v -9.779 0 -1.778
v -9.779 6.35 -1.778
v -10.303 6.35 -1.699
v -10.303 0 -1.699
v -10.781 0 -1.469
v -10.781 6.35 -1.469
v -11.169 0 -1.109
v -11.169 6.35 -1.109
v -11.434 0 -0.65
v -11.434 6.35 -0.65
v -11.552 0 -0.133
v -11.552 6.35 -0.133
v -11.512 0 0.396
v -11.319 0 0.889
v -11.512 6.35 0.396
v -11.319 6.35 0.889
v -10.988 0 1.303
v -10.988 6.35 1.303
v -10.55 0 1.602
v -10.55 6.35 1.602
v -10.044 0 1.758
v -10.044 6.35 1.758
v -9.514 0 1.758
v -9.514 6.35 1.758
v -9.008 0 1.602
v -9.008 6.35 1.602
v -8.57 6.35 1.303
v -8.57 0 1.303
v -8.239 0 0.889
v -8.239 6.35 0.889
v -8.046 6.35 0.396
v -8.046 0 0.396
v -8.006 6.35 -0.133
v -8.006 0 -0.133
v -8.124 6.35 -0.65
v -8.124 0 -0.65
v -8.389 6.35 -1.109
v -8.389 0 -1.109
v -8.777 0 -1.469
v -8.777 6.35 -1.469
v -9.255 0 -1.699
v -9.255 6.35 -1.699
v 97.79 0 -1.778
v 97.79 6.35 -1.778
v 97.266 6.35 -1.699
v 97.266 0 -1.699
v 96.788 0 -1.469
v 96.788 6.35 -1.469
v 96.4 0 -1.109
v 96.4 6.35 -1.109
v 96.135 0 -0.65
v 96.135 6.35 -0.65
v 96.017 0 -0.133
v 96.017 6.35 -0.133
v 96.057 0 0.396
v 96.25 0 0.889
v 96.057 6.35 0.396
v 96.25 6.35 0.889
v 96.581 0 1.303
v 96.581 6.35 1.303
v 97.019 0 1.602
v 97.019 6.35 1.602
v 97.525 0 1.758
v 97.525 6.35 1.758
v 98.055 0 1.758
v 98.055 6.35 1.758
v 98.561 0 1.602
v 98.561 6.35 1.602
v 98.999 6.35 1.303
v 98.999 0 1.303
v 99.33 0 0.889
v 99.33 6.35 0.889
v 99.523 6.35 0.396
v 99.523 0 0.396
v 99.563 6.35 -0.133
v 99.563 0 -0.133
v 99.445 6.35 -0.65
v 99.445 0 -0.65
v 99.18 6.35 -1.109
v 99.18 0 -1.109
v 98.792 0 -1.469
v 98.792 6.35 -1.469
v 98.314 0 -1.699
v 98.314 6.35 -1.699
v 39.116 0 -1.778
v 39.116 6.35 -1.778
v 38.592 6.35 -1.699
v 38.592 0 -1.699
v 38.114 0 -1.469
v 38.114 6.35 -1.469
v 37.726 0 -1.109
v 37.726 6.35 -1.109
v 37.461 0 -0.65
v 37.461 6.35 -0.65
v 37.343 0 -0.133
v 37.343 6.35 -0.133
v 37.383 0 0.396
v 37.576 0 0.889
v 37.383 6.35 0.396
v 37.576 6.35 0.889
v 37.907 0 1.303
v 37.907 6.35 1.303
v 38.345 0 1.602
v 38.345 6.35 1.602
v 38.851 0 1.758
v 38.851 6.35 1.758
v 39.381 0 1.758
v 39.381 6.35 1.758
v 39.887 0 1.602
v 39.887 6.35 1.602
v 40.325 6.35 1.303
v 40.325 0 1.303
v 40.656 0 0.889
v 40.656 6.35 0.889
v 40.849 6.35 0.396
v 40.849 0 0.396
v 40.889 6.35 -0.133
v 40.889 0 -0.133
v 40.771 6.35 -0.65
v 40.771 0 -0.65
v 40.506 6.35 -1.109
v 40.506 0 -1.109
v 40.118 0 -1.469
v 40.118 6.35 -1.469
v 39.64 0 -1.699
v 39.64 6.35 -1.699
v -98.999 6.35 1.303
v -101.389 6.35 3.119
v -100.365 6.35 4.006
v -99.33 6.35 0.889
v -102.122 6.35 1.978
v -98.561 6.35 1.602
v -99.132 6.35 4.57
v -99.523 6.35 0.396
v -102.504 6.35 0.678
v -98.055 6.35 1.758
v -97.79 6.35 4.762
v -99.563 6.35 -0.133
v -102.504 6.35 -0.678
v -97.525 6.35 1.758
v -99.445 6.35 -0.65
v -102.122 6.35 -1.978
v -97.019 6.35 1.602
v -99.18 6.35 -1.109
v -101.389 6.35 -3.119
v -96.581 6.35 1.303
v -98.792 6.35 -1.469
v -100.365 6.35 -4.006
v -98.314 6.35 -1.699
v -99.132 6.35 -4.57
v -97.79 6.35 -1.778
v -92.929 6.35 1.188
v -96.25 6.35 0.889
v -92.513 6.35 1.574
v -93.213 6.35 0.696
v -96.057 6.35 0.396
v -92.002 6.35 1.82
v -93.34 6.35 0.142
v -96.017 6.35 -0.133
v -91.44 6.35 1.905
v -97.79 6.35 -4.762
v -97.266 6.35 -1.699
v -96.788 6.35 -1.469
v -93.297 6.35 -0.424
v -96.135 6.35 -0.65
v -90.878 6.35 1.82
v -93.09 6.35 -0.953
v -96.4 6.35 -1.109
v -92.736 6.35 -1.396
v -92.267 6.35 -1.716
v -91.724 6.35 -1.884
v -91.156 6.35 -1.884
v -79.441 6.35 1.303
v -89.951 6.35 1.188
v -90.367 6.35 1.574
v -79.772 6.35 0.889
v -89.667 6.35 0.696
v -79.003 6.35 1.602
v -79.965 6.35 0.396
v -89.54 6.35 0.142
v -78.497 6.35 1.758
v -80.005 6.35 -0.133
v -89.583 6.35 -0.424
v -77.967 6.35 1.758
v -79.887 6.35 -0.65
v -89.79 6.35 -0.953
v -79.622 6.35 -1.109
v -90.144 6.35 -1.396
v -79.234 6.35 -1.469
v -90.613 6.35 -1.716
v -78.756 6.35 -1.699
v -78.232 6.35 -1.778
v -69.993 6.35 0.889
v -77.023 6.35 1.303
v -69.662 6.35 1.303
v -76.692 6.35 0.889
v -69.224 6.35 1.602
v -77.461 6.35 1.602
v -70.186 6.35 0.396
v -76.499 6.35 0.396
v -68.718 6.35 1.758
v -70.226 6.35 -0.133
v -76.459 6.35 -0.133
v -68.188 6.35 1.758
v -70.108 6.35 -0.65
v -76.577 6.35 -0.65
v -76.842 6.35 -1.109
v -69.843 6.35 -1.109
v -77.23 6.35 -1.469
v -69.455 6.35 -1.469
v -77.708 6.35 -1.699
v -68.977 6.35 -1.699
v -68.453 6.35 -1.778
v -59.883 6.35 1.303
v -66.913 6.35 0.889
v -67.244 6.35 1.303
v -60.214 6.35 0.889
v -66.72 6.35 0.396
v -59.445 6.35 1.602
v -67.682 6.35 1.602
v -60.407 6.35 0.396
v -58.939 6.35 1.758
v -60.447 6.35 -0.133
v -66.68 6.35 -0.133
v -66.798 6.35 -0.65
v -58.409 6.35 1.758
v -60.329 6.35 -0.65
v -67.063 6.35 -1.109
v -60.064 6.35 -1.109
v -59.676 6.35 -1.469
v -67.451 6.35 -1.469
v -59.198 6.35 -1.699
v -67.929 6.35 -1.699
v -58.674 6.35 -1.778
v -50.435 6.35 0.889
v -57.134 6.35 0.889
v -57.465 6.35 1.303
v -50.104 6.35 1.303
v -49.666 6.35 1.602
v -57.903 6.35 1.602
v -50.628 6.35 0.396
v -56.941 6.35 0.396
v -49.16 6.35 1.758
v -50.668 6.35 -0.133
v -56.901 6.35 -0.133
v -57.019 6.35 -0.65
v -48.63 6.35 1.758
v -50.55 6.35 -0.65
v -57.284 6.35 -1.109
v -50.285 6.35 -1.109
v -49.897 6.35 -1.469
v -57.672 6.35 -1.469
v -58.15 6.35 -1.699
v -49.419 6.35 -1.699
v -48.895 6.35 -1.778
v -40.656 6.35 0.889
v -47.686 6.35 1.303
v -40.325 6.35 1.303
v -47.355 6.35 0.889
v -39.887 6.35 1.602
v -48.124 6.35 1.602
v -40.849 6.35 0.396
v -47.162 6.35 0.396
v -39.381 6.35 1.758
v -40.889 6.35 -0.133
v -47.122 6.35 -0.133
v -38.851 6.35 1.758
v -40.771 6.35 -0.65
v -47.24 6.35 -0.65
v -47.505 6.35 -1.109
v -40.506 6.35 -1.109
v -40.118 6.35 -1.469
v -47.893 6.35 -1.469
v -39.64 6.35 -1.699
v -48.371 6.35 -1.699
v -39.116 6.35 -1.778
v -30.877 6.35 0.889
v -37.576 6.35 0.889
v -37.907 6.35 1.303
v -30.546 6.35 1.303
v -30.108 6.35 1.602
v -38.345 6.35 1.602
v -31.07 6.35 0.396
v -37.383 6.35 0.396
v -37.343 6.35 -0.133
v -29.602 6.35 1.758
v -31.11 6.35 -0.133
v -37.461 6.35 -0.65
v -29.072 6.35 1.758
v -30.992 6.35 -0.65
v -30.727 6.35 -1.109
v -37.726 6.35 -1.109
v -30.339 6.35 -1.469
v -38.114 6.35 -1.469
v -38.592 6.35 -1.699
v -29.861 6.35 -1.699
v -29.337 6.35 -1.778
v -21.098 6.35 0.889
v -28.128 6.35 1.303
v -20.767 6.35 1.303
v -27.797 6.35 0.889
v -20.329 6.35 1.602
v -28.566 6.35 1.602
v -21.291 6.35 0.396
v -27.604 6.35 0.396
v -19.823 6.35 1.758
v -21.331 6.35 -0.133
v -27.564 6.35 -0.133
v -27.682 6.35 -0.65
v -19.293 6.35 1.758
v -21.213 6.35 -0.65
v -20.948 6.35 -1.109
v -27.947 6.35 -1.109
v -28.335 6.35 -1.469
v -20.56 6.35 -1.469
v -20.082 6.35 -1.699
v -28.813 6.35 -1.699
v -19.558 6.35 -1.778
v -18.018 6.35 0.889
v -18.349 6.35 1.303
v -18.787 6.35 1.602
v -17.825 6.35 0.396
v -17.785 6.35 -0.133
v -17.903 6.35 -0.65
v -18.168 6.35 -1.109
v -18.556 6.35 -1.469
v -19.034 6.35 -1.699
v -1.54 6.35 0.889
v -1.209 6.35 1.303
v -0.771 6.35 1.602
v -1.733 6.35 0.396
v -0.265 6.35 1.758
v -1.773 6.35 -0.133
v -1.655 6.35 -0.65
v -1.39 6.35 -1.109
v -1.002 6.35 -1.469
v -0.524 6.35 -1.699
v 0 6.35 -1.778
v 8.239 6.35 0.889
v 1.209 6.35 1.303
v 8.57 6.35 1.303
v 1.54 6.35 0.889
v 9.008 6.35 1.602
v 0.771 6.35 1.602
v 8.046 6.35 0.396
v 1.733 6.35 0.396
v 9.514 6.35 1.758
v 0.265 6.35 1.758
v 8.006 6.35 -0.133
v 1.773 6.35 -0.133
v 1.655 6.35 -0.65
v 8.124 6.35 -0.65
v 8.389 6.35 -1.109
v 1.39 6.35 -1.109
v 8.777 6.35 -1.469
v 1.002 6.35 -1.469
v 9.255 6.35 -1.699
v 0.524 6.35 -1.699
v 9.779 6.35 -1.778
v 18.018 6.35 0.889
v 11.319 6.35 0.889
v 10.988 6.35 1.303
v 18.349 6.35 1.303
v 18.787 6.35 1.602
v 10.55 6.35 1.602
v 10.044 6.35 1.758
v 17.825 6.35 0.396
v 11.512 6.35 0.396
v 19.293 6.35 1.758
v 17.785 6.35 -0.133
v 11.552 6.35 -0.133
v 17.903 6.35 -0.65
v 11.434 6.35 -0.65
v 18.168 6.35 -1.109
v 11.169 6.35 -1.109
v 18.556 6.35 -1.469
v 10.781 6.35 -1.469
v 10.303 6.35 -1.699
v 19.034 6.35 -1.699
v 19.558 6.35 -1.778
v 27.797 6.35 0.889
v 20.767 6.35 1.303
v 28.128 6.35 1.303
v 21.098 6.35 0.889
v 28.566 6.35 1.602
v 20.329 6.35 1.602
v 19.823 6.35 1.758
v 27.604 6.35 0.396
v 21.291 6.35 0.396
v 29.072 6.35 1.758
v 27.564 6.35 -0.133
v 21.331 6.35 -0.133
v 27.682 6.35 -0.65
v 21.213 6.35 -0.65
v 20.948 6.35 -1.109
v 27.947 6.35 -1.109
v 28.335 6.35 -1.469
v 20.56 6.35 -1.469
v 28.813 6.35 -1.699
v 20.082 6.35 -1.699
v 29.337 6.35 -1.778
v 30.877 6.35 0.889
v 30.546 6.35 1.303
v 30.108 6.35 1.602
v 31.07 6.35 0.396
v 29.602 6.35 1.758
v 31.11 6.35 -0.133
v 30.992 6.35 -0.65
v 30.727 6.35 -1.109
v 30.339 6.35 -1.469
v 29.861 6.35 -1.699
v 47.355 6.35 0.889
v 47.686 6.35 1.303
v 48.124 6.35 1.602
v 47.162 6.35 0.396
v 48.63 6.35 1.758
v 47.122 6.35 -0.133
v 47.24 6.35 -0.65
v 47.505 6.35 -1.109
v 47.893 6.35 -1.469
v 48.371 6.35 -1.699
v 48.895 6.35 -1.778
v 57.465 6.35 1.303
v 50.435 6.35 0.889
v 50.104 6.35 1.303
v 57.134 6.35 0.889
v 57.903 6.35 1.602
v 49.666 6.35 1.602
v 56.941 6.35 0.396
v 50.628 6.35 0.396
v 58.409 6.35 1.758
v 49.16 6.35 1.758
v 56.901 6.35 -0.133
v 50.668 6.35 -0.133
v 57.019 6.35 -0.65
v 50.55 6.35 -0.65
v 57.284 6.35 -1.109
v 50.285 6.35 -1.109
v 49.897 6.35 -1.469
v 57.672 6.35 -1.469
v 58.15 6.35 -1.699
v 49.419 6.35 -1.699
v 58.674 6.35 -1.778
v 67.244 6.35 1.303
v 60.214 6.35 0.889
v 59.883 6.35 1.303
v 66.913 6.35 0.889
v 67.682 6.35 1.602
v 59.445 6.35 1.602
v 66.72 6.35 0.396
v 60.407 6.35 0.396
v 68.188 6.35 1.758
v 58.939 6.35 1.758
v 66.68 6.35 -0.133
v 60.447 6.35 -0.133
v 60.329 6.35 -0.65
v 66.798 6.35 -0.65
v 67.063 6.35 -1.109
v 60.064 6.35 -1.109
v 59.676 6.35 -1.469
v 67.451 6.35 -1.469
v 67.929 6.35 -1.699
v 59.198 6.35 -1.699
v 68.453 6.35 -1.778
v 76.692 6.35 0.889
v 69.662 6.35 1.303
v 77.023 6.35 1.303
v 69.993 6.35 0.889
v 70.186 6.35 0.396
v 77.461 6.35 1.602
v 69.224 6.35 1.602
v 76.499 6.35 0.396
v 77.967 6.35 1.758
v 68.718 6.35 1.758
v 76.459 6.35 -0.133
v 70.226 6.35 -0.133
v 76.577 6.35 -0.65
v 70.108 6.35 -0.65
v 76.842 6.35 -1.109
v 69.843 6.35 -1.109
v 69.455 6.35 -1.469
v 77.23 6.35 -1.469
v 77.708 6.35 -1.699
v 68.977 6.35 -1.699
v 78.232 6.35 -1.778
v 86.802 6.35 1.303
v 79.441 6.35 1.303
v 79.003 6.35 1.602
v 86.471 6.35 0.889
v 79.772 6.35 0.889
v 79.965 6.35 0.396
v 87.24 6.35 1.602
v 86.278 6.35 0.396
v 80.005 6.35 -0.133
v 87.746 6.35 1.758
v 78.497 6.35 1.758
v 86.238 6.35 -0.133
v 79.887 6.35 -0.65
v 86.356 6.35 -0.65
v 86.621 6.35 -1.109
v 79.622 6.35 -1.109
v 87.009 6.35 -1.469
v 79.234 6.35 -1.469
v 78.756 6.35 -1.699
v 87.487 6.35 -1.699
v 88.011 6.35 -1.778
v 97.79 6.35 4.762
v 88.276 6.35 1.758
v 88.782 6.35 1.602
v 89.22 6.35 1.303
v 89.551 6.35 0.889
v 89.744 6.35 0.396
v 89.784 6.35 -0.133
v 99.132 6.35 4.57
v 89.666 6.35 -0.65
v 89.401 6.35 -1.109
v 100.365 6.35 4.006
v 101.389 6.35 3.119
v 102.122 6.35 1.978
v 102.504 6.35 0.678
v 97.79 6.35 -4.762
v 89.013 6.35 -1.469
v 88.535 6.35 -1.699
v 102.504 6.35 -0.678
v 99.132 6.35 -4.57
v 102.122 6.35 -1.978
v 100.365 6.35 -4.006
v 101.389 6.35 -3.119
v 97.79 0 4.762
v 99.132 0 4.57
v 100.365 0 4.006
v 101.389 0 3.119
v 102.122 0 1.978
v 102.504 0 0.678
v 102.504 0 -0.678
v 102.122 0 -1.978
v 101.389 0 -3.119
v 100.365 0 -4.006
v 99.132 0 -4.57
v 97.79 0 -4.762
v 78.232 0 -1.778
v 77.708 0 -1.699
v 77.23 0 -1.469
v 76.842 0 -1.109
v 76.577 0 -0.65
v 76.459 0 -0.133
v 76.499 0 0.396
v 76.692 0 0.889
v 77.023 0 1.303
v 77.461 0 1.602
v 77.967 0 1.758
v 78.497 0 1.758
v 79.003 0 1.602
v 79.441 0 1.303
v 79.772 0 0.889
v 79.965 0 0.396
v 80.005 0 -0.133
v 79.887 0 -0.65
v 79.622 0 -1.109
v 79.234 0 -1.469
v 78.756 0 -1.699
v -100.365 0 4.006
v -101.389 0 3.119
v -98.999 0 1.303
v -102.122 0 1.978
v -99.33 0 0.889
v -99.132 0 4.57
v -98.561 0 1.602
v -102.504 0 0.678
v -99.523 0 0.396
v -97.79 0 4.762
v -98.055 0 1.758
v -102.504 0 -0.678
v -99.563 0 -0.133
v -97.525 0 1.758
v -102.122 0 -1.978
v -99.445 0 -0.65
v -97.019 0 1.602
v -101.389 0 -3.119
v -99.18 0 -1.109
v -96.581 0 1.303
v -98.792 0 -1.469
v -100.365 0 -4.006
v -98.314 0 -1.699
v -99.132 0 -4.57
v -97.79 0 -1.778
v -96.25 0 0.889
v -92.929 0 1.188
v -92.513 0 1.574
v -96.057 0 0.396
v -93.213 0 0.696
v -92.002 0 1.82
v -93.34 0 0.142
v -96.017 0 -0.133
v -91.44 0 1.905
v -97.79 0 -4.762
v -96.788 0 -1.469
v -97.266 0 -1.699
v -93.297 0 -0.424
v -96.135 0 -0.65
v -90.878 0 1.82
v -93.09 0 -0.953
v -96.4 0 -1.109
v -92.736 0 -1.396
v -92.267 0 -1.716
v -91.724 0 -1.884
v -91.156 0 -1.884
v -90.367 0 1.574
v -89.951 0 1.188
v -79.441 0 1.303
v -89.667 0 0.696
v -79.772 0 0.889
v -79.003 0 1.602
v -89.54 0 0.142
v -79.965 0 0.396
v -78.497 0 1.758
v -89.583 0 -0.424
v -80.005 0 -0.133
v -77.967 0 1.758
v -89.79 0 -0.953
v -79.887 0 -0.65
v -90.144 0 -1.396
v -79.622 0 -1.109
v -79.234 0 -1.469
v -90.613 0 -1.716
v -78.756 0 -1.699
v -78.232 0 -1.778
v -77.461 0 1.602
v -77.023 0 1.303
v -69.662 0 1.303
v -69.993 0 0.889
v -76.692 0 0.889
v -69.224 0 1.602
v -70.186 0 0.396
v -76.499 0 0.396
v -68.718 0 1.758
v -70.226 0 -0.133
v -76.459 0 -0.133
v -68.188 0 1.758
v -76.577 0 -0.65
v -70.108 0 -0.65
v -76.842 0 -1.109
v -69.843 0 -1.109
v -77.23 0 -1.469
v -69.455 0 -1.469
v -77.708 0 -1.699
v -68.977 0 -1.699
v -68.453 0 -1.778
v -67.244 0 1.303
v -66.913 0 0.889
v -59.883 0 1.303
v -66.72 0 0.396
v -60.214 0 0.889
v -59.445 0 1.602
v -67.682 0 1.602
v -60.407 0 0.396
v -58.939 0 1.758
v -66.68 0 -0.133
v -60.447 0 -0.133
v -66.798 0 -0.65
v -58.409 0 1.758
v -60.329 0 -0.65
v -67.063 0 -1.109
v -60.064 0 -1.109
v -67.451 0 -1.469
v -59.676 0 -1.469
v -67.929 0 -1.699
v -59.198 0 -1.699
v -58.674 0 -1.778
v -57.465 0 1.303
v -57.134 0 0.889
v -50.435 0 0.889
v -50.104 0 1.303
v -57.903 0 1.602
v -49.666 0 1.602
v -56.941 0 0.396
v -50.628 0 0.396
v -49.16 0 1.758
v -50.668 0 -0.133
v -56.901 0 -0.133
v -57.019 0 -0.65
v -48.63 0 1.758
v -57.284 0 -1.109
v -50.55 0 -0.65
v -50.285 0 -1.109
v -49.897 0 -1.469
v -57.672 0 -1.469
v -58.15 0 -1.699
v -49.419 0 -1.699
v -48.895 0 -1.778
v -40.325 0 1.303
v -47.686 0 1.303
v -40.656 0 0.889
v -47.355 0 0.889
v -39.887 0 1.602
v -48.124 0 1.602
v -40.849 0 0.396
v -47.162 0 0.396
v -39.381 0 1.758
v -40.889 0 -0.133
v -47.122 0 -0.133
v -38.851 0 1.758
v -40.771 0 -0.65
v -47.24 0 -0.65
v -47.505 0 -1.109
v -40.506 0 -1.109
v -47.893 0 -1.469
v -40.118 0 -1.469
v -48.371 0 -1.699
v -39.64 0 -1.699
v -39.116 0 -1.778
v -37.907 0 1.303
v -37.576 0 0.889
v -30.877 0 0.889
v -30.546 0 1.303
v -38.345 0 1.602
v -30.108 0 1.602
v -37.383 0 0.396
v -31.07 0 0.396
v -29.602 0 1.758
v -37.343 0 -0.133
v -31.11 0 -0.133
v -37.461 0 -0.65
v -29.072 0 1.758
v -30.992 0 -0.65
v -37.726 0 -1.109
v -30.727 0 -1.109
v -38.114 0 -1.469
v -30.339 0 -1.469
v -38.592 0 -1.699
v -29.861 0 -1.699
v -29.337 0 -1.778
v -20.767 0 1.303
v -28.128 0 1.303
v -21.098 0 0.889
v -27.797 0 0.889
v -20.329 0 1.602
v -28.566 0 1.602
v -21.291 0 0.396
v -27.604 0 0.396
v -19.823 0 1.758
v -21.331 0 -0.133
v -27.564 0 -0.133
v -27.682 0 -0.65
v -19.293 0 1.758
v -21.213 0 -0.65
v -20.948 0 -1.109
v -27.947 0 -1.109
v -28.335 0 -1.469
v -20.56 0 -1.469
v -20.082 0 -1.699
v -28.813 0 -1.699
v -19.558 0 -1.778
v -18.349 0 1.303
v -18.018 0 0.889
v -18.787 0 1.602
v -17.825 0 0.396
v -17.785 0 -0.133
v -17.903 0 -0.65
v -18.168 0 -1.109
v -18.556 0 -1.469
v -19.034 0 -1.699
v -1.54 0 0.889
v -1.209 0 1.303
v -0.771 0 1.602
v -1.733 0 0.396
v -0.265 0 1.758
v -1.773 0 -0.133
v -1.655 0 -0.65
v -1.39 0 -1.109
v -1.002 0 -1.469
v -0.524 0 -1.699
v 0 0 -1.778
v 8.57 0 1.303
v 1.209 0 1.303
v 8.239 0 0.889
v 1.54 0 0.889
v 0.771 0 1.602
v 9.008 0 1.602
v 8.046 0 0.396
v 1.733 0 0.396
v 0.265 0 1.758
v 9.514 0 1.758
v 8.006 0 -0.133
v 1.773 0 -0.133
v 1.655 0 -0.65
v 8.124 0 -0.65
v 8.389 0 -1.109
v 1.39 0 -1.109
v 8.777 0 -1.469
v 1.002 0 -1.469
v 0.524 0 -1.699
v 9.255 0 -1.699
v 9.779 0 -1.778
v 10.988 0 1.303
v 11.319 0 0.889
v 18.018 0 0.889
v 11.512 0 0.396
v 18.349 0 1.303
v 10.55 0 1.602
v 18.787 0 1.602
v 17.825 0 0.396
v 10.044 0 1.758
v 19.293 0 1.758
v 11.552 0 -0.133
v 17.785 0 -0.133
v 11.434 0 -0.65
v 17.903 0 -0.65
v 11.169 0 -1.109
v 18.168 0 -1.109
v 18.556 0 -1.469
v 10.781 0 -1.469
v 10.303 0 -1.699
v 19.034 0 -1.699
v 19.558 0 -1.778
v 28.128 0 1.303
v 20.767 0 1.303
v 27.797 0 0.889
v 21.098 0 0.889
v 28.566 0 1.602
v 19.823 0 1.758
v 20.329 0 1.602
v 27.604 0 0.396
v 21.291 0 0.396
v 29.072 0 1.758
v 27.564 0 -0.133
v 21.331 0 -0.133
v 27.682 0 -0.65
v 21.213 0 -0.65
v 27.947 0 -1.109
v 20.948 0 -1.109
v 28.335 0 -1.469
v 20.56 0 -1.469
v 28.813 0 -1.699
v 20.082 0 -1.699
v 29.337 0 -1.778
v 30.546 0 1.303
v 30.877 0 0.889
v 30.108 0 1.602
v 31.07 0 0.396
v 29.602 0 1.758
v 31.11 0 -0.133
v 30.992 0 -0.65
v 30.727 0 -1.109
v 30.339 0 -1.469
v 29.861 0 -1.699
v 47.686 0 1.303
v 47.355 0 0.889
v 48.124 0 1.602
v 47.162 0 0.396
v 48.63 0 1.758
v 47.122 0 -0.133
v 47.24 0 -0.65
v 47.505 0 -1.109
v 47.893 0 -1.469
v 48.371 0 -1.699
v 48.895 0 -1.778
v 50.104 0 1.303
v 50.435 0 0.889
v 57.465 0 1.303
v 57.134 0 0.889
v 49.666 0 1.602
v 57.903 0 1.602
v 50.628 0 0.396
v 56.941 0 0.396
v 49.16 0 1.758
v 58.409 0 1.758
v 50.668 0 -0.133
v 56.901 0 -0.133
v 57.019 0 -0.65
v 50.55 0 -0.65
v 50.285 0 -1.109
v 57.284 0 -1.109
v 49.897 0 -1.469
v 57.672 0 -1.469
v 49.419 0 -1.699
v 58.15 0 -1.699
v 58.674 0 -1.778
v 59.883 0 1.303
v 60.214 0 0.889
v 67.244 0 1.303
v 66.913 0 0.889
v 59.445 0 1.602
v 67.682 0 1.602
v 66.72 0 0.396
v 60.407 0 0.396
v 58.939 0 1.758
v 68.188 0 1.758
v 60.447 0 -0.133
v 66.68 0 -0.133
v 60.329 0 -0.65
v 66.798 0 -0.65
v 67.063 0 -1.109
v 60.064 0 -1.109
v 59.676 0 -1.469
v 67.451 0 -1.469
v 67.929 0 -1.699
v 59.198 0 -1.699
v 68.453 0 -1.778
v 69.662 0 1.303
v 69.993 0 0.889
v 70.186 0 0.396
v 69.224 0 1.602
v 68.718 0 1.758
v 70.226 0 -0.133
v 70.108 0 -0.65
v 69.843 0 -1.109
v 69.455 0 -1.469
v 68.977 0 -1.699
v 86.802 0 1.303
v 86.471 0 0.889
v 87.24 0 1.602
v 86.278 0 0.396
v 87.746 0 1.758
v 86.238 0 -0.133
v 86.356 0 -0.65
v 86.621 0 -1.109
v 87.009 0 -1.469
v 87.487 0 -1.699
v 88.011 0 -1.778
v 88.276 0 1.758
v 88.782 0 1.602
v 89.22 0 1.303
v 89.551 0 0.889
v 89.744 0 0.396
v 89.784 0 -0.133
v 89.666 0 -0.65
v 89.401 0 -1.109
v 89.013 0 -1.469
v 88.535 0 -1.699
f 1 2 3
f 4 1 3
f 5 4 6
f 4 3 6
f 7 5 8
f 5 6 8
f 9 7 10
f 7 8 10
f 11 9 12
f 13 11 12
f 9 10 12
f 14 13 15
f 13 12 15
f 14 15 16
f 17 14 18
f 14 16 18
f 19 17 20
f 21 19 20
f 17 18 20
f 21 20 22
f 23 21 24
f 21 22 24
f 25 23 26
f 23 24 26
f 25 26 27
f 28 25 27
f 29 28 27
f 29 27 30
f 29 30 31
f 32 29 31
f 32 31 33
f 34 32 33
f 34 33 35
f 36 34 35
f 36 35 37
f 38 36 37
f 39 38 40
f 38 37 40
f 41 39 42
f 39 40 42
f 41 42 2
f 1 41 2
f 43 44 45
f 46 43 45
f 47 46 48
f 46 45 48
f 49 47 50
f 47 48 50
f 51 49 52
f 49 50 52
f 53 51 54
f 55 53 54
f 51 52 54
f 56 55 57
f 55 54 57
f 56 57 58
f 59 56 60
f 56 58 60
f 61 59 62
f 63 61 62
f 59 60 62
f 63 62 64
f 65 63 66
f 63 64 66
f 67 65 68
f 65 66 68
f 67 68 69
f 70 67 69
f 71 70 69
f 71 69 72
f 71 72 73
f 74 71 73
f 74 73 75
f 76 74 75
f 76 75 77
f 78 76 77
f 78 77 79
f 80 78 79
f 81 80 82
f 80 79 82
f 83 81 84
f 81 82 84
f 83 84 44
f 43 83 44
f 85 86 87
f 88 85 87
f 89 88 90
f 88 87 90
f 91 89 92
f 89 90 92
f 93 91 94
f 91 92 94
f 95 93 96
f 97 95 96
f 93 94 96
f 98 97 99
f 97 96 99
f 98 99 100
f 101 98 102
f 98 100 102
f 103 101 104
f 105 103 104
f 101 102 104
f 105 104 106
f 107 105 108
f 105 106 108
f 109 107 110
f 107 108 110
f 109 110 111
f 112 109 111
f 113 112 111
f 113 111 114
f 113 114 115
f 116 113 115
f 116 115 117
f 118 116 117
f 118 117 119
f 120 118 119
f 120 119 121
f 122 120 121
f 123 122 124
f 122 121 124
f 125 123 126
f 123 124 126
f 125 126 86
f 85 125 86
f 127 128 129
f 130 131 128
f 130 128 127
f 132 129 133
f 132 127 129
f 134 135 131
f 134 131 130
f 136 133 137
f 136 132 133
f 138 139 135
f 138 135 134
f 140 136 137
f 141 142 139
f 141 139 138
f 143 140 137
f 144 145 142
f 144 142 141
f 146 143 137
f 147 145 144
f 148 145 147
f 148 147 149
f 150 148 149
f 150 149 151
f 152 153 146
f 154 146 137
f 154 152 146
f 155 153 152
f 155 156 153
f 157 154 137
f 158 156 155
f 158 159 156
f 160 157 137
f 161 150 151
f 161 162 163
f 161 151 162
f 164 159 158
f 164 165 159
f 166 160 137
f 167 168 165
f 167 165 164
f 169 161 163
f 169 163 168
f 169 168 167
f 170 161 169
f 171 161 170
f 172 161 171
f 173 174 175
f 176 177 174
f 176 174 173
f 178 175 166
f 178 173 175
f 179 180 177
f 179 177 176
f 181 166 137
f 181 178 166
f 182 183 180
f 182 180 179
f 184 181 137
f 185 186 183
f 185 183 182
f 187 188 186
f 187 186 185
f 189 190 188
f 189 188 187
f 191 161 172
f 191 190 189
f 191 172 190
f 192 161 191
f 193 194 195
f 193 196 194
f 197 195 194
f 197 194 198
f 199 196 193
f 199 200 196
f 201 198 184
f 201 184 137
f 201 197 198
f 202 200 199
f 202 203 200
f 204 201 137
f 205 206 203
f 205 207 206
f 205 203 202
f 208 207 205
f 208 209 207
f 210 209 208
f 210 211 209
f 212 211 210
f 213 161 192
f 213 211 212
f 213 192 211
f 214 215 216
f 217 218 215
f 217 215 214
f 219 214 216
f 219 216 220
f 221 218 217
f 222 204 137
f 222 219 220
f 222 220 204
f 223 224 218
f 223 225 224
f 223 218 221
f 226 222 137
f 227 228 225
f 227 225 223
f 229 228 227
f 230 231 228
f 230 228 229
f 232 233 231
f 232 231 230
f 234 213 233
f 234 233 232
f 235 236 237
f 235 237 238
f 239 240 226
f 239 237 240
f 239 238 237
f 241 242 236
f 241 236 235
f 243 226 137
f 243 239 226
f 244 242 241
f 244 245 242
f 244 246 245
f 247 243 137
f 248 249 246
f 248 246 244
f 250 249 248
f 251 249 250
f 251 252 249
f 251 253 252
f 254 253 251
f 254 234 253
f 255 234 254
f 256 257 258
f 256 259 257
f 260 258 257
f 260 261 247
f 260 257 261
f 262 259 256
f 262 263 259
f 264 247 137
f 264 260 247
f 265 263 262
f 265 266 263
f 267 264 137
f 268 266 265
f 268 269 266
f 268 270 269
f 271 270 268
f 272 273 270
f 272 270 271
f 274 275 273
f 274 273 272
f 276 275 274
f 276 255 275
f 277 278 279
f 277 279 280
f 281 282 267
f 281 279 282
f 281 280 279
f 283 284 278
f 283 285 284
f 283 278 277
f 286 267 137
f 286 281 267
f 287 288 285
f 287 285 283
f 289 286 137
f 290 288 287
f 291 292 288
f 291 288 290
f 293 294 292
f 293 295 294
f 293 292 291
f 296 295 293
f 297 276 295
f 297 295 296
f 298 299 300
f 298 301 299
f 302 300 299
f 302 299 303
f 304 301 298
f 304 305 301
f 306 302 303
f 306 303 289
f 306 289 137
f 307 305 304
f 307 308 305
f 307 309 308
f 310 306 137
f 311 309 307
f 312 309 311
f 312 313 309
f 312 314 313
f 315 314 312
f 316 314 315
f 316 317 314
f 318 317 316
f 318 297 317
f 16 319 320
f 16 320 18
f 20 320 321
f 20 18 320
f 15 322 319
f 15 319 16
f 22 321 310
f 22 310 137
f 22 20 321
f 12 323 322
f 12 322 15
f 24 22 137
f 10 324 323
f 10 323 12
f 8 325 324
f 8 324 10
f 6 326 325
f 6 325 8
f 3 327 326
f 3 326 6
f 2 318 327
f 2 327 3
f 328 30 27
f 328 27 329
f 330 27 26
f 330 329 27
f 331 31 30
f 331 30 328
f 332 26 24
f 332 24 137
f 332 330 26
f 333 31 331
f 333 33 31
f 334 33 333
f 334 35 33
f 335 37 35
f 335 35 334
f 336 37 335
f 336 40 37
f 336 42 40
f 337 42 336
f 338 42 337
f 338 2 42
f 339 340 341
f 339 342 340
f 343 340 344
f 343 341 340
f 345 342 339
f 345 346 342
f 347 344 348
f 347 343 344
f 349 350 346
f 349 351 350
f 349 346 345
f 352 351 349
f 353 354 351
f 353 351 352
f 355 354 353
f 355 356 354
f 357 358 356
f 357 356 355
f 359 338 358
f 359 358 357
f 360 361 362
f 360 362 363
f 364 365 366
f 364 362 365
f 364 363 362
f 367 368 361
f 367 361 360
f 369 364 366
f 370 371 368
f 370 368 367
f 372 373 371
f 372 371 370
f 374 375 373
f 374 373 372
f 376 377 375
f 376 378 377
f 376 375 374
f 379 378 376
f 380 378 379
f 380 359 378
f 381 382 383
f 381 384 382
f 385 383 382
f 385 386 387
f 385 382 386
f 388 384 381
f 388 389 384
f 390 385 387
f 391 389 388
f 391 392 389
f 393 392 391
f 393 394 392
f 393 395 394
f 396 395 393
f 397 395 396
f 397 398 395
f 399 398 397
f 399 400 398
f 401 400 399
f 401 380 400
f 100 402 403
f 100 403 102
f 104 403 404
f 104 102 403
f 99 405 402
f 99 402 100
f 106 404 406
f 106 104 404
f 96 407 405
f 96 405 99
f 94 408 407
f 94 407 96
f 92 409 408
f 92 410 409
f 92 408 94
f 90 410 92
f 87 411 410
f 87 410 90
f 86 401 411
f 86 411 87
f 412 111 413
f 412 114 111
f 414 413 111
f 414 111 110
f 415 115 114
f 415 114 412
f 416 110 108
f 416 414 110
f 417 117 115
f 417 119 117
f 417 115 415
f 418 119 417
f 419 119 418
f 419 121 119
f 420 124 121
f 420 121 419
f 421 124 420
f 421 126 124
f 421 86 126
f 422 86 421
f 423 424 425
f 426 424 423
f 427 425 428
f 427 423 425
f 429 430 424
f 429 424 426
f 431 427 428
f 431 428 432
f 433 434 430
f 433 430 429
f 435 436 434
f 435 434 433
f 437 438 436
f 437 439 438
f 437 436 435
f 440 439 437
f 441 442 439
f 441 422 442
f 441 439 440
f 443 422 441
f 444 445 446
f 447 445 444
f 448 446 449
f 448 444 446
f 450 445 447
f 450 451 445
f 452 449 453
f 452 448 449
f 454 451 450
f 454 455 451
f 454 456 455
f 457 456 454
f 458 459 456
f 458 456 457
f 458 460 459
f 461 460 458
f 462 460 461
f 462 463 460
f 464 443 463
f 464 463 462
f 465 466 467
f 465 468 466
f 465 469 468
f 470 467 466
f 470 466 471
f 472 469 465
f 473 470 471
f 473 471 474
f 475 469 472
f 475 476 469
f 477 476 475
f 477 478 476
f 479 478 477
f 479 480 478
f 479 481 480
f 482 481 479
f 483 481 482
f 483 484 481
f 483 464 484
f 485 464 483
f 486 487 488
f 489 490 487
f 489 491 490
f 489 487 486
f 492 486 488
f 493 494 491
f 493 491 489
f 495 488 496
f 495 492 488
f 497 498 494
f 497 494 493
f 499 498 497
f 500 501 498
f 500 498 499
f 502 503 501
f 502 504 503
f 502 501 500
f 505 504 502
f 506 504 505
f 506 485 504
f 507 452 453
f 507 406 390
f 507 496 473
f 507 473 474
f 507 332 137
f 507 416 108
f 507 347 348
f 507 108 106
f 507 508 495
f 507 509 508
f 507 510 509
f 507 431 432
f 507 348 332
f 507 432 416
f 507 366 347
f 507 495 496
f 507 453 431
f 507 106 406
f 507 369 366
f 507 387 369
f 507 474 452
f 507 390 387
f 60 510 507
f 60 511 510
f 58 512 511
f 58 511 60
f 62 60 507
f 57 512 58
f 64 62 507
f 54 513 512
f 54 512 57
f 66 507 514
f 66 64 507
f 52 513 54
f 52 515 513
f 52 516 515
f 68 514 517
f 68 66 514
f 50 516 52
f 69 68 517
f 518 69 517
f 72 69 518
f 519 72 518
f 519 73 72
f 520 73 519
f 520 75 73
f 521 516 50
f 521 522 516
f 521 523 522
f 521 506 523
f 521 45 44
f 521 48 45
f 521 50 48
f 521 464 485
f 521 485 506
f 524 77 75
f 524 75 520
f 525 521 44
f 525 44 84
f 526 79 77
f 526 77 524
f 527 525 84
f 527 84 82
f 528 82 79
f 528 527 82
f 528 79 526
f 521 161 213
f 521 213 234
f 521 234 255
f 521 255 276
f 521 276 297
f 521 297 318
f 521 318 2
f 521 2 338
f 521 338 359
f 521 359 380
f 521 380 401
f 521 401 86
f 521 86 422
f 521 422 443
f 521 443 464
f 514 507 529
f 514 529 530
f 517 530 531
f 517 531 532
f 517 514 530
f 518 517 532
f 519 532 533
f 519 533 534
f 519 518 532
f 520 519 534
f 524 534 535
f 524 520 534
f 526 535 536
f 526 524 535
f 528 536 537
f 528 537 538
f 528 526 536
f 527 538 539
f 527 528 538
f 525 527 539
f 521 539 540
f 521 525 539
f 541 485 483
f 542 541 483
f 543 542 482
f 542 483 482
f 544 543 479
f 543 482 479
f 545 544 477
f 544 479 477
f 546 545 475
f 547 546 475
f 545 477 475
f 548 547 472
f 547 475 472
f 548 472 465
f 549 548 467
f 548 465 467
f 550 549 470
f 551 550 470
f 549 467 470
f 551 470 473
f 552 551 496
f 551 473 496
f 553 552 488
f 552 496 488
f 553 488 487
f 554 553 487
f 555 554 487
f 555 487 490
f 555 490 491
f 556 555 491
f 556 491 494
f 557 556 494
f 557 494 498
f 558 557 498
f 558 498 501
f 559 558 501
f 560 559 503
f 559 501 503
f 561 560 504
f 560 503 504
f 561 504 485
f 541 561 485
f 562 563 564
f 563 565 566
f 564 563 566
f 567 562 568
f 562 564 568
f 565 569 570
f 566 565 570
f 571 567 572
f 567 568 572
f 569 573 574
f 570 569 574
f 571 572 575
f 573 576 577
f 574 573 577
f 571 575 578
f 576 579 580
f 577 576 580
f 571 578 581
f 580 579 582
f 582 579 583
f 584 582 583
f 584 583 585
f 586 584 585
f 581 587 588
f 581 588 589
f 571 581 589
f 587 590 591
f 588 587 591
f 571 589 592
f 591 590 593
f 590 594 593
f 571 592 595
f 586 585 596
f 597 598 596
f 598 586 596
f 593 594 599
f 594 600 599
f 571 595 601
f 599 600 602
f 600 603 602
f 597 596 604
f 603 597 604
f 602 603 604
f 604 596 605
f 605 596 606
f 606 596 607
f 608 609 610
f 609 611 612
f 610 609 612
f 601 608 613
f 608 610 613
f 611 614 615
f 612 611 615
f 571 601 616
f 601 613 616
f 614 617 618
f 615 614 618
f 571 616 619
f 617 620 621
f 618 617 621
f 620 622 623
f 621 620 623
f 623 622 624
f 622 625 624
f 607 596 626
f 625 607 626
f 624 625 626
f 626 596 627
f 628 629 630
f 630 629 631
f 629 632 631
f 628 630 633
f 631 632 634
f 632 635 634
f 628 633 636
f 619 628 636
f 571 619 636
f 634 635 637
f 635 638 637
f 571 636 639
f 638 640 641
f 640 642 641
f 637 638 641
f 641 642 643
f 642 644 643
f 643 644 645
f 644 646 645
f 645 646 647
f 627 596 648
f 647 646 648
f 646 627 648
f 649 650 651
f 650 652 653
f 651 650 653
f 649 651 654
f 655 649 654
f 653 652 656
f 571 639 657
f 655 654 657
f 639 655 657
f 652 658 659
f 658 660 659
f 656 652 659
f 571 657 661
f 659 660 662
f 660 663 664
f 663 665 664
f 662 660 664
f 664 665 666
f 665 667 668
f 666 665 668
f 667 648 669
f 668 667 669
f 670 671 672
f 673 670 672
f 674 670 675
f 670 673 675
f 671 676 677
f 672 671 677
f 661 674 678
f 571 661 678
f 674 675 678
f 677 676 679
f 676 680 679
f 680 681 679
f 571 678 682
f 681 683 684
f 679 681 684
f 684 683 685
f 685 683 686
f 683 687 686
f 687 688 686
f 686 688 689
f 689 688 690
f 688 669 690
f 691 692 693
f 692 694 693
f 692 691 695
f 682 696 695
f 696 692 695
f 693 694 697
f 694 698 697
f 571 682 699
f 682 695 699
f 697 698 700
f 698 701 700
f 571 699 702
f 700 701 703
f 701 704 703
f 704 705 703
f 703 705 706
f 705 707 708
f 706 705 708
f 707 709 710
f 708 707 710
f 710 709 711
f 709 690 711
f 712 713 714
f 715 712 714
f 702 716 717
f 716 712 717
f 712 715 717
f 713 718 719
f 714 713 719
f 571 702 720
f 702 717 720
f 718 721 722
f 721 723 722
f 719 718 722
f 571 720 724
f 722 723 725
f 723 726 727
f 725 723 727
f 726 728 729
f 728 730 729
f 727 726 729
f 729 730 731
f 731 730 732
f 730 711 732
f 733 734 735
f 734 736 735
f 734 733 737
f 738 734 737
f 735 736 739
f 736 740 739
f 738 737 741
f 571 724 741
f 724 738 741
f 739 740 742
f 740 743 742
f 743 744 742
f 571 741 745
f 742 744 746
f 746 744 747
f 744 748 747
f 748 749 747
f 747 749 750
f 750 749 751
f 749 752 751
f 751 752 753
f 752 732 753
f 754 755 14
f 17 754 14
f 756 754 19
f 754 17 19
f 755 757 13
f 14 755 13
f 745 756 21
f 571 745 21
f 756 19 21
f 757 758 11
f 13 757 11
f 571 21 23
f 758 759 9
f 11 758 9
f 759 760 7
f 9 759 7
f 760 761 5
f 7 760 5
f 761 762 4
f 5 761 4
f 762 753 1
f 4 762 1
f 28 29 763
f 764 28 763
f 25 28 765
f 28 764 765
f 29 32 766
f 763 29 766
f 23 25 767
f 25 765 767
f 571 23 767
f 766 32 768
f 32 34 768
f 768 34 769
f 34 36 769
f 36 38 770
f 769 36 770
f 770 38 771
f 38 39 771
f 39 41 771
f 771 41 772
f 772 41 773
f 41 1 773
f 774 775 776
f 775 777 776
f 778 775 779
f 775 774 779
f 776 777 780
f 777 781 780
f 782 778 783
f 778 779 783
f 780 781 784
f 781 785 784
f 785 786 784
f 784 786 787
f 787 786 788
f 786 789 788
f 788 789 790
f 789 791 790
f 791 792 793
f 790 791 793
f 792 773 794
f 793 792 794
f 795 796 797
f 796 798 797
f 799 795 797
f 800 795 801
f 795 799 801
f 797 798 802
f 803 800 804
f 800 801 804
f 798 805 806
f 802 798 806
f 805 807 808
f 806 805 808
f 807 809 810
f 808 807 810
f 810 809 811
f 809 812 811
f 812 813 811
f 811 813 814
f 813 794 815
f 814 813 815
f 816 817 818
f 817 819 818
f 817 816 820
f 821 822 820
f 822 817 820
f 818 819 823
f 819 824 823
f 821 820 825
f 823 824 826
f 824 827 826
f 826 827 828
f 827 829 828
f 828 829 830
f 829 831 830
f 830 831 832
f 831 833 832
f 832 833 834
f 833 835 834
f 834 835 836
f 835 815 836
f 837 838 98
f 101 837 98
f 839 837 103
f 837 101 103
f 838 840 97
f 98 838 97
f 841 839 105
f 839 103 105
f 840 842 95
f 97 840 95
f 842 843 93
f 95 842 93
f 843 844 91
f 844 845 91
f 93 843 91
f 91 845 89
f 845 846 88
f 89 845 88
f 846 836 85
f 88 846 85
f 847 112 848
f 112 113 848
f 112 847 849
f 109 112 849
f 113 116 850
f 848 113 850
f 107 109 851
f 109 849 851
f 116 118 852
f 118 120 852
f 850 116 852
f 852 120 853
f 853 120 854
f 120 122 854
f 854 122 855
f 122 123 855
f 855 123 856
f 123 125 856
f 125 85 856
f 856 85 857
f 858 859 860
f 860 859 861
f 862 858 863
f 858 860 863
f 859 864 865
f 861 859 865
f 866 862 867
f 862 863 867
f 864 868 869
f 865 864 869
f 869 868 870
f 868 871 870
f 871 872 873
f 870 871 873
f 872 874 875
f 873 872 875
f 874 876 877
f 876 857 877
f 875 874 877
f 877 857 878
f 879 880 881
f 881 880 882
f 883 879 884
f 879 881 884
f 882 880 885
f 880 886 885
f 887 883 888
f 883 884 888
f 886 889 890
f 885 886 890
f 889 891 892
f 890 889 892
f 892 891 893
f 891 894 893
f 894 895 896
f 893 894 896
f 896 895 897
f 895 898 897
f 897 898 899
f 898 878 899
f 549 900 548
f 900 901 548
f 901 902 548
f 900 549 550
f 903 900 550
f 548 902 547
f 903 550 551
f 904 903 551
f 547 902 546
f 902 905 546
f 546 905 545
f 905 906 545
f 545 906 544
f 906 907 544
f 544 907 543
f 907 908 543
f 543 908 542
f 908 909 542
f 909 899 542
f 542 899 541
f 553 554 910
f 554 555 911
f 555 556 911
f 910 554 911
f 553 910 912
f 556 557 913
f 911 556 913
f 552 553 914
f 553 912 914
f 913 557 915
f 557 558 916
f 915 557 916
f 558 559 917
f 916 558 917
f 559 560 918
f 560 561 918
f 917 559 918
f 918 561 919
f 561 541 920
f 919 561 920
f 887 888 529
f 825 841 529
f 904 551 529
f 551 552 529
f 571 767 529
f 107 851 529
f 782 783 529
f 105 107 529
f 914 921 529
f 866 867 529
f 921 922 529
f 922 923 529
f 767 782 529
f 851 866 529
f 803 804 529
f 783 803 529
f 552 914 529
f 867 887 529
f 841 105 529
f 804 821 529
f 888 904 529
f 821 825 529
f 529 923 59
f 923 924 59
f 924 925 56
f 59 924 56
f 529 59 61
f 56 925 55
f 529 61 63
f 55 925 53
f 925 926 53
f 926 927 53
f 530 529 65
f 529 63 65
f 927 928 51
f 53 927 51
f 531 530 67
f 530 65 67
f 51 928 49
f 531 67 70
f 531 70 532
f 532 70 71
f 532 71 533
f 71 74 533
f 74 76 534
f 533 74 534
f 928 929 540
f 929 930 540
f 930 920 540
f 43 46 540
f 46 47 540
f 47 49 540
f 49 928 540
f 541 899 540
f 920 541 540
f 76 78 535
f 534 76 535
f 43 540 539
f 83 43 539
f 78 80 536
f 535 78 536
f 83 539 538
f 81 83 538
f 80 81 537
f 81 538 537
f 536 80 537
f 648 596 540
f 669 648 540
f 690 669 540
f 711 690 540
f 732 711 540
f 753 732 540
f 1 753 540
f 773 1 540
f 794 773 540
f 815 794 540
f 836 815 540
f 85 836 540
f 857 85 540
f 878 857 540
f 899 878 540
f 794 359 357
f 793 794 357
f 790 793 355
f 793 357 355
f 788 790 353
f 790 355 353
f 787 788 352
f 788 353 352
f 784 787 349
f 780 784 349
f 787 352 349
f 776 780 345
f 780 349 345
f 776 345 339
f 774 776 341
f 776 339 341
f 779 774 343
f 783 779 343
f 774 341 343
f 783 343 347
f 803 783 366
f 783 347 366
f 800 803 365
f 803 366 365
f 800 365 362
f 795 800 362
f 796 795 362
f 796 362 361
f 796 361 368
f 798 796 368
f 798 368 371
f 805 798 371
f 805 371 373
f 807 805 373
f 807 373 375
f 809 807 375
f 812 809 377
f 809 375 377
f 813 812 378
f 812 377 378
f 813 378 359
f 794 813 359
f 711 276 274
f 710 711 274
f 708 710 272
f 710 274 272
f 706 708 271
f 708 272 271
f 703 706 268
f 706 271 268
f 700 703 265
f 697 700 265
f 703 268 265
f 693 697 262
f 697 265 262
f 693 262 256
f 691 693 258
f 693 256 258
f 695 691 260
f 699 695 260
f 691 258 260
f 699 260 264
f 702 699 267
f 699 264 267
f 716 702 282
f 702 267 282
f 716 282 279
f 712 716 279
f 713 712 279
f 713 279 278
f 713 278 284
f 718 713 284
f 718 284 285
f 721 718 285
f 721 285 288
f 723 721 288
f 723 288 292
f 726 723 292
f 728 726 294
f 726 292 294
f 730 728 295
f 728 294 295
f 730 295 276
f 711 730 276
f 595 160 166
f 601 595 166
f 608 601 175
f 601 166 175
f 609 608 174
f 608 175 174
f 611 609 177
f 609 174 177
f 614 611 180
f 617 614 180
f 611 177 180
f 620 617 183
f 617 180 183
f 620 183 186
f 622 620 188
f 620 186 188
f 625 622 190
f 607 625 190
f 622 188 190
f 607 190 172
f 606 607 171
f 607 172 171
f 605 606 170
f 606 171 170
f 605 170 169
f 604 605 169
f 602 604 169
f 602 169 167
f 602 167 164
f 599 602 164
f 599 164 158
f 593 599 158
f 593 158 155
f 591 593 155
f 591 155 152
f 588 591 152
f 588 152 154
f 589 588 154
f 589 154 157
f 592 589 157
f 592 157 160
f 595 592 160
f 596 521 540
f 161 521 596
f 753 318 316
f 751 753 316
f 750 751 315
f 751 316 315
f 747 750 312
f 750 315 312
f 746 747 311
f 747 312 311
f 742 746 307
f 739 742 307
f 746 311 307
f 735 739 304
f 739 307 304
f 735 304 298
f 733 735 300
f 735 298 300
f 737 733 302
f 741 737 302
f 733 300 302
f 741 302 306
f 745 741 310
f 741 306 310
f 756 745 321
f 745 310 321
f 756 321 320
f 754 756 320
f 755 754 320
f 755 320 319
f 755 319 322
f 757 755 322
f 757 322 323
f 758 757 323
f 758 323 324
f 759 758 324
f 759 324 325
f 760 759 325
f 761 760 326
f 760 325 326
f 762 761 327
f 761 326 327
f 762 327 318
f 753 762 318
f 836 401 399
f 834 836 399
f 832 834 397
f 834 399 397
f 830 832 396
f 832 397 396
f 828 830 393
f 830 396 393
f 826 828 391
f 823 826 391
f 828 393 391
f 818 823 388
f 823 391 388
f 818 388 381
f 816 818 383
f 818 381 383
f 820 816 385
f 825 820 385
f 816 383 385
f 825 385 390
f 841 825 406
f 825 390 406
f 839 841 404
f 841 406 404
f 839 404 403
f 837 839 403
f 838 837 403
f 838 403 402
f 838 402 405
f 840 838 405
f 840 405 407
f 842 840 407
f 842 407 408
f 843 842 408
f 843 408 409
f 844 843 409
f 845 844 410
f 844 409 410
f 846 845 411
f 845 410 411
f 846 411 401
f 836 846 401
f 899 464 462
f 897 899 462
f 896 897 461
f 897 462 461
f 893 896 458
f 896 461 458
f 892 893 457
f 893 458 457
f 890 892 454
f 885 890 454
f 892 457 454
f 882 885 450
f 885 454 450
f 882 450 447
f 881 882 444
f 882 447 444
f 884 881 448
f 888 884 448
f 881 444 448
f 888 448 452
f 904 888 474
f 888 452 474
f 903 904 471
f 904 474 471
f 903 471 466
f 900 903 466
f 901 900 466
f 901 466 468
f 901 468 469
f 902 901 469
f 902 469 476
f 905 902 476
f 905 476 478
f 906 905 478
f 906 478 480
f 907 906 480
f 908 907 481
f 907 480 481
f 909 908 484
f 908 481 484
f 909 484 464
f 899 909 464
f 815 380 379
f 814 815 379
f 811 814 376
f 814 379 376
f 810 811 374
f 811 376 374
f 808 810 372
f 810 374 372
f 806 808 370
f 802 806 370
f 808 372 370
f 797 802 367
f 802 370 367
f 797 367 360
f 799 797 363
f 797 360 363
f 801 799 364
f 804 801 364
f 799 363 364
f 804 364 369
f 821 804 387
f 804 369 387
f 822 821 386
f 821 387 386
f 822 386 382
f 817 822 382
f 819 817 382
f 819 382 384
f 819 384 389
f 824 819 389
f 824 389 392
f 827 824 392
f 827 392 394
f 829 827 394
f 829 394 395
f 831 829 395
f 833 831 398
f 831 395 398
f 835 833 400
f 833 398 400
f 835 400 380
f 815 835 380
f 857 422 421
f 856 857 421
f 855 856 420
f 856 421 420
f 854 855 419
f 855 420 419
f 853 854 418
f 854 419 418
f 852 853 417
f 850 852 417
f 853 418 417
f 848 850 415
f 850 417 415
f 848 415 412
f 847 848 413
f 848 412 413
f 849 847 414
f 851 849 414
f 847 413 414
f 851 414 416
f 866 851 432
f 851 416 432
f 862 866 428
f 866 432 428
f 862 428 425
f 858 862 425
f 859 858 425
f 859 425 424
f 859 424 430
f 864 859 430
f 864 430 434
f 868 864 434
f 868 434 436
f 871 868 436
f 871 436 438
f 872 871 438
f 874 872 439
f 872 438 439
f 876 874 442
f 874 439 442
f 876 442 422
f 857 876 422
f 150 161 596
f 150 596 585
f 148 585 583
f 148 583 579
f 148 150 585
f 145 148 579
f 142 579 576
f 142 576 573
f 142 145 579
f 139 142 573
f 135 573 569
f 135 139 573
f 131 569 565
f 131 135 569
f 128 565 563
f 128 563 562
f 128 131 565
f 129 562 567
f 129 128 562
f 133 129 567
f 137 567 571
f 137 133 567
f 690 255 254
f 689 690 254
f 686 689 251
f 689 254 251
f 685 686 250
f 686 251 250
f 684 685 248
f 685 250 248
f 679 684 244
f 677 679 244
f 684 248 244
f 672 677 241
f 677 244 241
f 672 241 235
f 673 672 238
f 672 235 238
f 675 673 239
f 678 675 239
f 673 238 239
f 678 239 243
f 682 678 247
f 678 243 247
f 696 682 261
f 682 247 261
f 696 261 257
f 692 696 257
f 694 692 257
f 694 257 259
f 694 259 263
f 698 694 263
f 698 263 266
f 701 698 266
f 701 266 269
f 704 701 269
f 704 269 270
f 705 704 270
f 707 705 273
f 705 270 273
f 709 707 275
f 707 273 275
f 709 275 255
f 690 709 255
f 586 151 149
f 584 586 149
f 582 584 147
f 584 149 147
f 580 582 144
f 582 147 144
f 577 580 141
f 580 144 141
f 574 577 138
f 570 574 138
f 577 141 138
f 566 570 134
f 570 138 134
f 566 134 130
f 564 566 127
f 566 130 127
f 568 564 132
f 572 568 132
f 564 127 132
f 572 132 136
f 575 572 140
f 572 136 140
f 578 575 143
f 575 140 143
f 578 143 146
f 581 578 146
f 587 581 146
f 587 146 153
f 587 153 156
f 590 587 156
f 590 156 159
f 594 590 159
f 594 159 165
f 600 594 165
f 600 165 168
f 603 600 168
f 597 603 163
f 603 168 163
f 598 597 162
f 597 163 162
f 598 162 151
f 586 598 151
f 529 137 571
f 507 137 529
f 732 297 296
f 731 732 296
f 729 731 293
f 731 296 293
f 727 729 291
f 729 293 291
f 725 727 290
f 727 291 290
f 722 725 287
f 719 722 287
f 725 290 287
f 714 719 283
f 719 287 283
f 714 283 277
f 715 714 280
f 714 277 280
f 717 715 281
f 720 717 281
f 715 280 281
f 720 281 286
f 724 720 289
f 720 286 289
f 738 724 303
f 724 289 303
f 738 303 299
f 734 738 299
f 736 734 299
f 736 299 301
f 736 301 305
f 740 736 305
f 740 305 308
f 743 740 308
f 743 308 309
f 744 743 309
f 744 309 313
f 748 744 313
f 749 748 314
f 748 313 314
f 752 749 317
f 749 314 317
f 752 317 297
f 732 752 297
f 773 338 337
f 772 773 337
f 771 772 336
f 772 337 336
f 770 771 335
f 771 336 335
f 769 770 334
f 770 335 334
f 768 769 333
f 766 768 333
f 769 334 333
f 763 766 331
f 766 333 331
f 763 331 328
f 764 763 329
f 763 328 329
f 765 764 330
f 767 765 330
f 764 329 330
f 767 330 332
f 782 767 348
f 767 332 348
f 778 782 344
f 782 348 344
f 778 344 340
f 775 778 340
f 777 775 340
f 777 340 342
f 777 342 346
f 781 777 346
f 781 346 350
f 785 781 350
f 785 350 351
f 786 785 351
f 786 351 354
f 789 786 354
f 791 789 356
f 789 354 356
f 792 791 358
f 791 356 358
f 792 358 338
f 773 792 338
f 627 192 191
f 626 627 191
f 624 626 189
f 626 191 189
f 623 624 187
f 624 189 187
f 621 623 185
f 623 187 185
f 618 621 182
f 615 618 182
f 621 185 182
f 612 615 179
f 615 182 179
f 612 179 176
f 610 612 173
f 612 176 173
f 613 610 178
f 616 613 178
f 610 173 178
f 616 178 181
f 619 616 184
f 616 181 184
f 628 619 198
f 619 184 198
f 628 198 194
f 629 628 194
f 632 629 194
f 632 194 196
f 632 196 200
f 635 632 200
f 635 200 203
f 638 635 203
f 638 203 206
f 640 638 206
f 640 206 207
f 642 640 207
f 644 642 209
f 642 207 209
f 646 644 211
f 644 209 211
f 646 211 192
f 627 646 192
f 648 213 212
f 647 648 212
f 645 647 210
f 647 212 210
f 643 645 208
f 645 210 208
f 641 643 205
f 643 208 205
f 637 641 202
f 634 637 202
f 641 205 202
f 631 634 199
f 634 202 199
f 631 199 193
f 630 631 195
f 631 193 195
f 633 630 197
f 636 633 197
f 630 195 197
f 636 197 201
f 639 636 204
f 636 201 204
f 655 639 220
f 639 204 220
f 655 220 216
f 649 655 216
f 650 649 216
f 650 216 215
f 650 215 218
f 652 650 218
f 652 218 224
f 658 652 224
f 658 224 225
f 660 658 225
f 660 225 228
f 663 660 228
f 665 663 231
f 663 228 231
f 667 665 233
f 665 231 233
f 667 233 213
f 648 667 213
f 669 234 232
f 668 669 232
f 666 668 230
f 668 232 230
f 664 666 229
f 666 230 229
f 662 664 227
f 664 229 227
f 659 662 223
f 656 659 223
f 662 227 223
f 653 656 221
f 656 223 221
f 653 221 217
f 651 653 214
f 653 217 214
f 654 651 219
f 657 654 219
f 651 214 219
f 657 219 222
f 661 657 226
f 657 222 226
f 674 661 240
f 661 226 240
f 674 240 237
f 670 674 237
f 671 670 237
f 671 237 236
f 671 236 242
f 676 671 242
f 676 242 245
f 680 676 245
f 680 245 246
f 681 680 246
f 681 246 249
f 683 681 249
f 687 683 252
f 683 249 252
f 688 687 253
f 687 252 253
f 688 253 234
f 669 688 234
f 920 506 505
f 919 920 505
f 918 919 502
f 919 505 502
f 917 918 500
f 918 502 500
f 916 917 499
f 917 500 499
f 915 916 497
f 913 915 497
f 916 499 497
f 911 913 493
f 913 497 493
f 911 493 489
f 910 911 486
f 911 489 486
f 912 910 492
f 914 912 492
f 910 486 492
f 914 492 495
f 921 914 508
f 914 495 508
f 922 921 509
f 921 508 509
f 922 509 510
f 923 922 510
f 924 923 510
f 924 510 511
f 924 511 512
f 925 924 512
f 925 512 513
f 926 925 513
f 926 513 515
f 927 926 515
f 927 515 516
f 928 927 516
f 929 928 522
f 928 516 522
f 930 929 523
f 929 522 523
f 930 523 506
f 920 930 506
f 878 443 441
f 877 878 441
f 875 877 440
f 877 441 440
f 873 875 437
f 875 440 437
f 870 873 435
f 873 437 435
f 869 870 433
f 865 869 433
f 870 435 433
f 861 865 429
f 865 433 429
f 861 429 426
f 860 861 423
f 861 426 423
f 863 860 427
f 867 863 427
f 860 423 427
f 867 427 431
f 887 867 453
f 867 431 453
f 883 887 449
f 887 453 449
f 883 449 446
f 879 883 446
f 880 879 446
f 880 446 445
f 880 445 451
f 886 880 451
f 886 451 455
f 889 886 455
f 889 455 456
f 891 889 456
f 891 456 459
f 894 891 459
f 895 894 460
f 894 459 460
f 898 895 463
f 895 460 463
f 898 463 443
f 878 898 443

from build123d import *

# Parameters (mm, degrees)
SKETCH1_R           = 1.778
BOSS_EXTRUDE1_DEPTH = 6.35
SKETCH2_R           = 1.778
BOSS_EXTRUDE2_DEPTH = 6.35
SKETCH3_R           = 1.905
CUT_EXTRUDE1_DEPTH  = 103.859220114


with BuildPart() as part:
    # Sketch1 → Boss-Extrude1 (new body)
    with BuildSketch(Plane(origin=(0, 6.35, 0), x_dir=(1, 0, 0), z_dir=(0, 1, 0))):
        with BuildLine():
            Line((97.79, 4.7625), (-97.79, 4.7625))
            ThreePointArc((-97.79, 4.7625), (-102.5525, 0), (-97.79, -4.7625))
            Line((-97.79, -4.7625), (97.79, -4.7625))
            ThreePointArc((97.79, -4.7625), (102.5525, 0), (97.79, 4.7625))
        make_face()
        with Locations(Location((97.79, 0, 0), (0, 0, 90))):
            Circle(SKETCH1_R, mode=Mode.SUBTRACT)
        with Locations(Location((88.011, 0, 0), (0, 0, 90))):
            Circle(SKETCH1_R, mode=Mode.SUBTRACT)
        with Locations(Location((78.232, 0, 0), (0, 0, 90))):
            Circle(SKETCH1_R, mode=Mode.SUBTRACT)
        with Locations(Location((68.453, 0, 0), (0, 0, 90))):
            Circle(SKETCH1_R, mode=Mode.SUBTRACT)
        with Locations(Location((58.674, 0, 0), (0, 0, 90))):
            Circle(SKETCH1_R, mode=Mode.SUBTRACT)
        with Locations(Location((48.895, 0, 0), (0, 0, 90))):
            Circle(SKETCH1_R, mode=Mode.SUBTRACT)
        with Locations(Location((39.116, 0, 0), (0, 0, 90))):
            Circle(SKETCH1_R, mode=Mode.SUBTRACT)
        with Locations(Location((29.337, 0, 0), (0, 0, 90))):
            Circle(SKETCH1_R, mode=Mode.SUBTRACT)
        with Locations(Location((19.558, 0, 0), (0, 0, 90))):
            Circle(SKETCH1_R, mode=Mode.SUBTRACT)
        with Locations(Location((9.779, 0, 0), (0, 0, 90))):
            Circle(SKETCH1_R, mode=Mode.SUBTRACT)
        with Locations(Location((0, 0, 0), (0, 0, 90))):
            Circle(SKETCH1_R, mode=Mode.SUBTRACT)
        with Locations(Location((-9.779, 0, 0), (0, 0, 90))):
            Circle(SKETCH1_R, mode=Mode.SUBTRACT)
        with Locations(Location((-19.558, 0, 0), (0, 0, 90))):
            Circle(SKETCH1_R, mode=Mode.SUBTRACT)
        with Locations(Location((-29.337, 0, 0), (0, 0, 90))):
            Circle(SKETCH1_R, mode=Mode.SUBTRACT)
        with Locations(Location((-39.116, 0, 0), (0, 0, 90))):
            Circle(SKETCH1_R, mode=Mode.SUBTRACT)
        with Locations(Location((-48.895, 0, 0), (0, 0, 90))):
            Circle(SKETCH1_R, mode=Mode.SUBTRACT)
        with Locations(Location((-58.674, 0, 0), (0, 0, 90))):
            Circle(SKETCH1_R, mode=Mode.SUBTRACT)
        with Locations(Location((-68.453, 0, 0), (0, 0, 90))):
            Circle(SKETCH1_R, mode=Mode.SUBTRACT)
        with Locations(Location((-78.232, 0, 0), (0, 0, 90))):
            Circle(SKETCH1_R, mode=Mode.SUBTRACT)
        with Locations(Location((-88.011, 0, 0), (0, 0, 90))):
            Circle(SKETCH1_R, mode=Mode.SUBTRACT)
        with Locations(Location((-97.79, 0, 0), (0, 0, 90))):
            Circle(SKETCH1_R, mode=Mode.SUBTRACT)
    extrude(amount=-BOSS_EXTRUDE1_DEPTH)

    # Sketch2 → Boss-Extrude2 (add)
    with BuildSketch(Plane(origin=(0, 6.35, 0), x_dir=(1, 0, 0), z_dir=(0, 1, 0))):
        with Locations((-88.011, 0)):
            Circle(SKETCH2_R)
    extrude(amount=-BOSS_EXTRUDE2_DEPTH)

    # Sketch3 → Cut-Extrude1 (cut, through all)
    with BuildSketch(Plane(origin=(0, 6.35, 0), x_dir=(1, 0, 0), z_dir=(0, 1, 0))):
        with Locations(Location((-91.44, 0, 0), (0, 0, 270))):
            Circle(SKETCH3_R)
    extrude(amount=-CUT_EXTRUDE1_DEPTH, mode=Mode.SUBTRACT)


solid = part.part
